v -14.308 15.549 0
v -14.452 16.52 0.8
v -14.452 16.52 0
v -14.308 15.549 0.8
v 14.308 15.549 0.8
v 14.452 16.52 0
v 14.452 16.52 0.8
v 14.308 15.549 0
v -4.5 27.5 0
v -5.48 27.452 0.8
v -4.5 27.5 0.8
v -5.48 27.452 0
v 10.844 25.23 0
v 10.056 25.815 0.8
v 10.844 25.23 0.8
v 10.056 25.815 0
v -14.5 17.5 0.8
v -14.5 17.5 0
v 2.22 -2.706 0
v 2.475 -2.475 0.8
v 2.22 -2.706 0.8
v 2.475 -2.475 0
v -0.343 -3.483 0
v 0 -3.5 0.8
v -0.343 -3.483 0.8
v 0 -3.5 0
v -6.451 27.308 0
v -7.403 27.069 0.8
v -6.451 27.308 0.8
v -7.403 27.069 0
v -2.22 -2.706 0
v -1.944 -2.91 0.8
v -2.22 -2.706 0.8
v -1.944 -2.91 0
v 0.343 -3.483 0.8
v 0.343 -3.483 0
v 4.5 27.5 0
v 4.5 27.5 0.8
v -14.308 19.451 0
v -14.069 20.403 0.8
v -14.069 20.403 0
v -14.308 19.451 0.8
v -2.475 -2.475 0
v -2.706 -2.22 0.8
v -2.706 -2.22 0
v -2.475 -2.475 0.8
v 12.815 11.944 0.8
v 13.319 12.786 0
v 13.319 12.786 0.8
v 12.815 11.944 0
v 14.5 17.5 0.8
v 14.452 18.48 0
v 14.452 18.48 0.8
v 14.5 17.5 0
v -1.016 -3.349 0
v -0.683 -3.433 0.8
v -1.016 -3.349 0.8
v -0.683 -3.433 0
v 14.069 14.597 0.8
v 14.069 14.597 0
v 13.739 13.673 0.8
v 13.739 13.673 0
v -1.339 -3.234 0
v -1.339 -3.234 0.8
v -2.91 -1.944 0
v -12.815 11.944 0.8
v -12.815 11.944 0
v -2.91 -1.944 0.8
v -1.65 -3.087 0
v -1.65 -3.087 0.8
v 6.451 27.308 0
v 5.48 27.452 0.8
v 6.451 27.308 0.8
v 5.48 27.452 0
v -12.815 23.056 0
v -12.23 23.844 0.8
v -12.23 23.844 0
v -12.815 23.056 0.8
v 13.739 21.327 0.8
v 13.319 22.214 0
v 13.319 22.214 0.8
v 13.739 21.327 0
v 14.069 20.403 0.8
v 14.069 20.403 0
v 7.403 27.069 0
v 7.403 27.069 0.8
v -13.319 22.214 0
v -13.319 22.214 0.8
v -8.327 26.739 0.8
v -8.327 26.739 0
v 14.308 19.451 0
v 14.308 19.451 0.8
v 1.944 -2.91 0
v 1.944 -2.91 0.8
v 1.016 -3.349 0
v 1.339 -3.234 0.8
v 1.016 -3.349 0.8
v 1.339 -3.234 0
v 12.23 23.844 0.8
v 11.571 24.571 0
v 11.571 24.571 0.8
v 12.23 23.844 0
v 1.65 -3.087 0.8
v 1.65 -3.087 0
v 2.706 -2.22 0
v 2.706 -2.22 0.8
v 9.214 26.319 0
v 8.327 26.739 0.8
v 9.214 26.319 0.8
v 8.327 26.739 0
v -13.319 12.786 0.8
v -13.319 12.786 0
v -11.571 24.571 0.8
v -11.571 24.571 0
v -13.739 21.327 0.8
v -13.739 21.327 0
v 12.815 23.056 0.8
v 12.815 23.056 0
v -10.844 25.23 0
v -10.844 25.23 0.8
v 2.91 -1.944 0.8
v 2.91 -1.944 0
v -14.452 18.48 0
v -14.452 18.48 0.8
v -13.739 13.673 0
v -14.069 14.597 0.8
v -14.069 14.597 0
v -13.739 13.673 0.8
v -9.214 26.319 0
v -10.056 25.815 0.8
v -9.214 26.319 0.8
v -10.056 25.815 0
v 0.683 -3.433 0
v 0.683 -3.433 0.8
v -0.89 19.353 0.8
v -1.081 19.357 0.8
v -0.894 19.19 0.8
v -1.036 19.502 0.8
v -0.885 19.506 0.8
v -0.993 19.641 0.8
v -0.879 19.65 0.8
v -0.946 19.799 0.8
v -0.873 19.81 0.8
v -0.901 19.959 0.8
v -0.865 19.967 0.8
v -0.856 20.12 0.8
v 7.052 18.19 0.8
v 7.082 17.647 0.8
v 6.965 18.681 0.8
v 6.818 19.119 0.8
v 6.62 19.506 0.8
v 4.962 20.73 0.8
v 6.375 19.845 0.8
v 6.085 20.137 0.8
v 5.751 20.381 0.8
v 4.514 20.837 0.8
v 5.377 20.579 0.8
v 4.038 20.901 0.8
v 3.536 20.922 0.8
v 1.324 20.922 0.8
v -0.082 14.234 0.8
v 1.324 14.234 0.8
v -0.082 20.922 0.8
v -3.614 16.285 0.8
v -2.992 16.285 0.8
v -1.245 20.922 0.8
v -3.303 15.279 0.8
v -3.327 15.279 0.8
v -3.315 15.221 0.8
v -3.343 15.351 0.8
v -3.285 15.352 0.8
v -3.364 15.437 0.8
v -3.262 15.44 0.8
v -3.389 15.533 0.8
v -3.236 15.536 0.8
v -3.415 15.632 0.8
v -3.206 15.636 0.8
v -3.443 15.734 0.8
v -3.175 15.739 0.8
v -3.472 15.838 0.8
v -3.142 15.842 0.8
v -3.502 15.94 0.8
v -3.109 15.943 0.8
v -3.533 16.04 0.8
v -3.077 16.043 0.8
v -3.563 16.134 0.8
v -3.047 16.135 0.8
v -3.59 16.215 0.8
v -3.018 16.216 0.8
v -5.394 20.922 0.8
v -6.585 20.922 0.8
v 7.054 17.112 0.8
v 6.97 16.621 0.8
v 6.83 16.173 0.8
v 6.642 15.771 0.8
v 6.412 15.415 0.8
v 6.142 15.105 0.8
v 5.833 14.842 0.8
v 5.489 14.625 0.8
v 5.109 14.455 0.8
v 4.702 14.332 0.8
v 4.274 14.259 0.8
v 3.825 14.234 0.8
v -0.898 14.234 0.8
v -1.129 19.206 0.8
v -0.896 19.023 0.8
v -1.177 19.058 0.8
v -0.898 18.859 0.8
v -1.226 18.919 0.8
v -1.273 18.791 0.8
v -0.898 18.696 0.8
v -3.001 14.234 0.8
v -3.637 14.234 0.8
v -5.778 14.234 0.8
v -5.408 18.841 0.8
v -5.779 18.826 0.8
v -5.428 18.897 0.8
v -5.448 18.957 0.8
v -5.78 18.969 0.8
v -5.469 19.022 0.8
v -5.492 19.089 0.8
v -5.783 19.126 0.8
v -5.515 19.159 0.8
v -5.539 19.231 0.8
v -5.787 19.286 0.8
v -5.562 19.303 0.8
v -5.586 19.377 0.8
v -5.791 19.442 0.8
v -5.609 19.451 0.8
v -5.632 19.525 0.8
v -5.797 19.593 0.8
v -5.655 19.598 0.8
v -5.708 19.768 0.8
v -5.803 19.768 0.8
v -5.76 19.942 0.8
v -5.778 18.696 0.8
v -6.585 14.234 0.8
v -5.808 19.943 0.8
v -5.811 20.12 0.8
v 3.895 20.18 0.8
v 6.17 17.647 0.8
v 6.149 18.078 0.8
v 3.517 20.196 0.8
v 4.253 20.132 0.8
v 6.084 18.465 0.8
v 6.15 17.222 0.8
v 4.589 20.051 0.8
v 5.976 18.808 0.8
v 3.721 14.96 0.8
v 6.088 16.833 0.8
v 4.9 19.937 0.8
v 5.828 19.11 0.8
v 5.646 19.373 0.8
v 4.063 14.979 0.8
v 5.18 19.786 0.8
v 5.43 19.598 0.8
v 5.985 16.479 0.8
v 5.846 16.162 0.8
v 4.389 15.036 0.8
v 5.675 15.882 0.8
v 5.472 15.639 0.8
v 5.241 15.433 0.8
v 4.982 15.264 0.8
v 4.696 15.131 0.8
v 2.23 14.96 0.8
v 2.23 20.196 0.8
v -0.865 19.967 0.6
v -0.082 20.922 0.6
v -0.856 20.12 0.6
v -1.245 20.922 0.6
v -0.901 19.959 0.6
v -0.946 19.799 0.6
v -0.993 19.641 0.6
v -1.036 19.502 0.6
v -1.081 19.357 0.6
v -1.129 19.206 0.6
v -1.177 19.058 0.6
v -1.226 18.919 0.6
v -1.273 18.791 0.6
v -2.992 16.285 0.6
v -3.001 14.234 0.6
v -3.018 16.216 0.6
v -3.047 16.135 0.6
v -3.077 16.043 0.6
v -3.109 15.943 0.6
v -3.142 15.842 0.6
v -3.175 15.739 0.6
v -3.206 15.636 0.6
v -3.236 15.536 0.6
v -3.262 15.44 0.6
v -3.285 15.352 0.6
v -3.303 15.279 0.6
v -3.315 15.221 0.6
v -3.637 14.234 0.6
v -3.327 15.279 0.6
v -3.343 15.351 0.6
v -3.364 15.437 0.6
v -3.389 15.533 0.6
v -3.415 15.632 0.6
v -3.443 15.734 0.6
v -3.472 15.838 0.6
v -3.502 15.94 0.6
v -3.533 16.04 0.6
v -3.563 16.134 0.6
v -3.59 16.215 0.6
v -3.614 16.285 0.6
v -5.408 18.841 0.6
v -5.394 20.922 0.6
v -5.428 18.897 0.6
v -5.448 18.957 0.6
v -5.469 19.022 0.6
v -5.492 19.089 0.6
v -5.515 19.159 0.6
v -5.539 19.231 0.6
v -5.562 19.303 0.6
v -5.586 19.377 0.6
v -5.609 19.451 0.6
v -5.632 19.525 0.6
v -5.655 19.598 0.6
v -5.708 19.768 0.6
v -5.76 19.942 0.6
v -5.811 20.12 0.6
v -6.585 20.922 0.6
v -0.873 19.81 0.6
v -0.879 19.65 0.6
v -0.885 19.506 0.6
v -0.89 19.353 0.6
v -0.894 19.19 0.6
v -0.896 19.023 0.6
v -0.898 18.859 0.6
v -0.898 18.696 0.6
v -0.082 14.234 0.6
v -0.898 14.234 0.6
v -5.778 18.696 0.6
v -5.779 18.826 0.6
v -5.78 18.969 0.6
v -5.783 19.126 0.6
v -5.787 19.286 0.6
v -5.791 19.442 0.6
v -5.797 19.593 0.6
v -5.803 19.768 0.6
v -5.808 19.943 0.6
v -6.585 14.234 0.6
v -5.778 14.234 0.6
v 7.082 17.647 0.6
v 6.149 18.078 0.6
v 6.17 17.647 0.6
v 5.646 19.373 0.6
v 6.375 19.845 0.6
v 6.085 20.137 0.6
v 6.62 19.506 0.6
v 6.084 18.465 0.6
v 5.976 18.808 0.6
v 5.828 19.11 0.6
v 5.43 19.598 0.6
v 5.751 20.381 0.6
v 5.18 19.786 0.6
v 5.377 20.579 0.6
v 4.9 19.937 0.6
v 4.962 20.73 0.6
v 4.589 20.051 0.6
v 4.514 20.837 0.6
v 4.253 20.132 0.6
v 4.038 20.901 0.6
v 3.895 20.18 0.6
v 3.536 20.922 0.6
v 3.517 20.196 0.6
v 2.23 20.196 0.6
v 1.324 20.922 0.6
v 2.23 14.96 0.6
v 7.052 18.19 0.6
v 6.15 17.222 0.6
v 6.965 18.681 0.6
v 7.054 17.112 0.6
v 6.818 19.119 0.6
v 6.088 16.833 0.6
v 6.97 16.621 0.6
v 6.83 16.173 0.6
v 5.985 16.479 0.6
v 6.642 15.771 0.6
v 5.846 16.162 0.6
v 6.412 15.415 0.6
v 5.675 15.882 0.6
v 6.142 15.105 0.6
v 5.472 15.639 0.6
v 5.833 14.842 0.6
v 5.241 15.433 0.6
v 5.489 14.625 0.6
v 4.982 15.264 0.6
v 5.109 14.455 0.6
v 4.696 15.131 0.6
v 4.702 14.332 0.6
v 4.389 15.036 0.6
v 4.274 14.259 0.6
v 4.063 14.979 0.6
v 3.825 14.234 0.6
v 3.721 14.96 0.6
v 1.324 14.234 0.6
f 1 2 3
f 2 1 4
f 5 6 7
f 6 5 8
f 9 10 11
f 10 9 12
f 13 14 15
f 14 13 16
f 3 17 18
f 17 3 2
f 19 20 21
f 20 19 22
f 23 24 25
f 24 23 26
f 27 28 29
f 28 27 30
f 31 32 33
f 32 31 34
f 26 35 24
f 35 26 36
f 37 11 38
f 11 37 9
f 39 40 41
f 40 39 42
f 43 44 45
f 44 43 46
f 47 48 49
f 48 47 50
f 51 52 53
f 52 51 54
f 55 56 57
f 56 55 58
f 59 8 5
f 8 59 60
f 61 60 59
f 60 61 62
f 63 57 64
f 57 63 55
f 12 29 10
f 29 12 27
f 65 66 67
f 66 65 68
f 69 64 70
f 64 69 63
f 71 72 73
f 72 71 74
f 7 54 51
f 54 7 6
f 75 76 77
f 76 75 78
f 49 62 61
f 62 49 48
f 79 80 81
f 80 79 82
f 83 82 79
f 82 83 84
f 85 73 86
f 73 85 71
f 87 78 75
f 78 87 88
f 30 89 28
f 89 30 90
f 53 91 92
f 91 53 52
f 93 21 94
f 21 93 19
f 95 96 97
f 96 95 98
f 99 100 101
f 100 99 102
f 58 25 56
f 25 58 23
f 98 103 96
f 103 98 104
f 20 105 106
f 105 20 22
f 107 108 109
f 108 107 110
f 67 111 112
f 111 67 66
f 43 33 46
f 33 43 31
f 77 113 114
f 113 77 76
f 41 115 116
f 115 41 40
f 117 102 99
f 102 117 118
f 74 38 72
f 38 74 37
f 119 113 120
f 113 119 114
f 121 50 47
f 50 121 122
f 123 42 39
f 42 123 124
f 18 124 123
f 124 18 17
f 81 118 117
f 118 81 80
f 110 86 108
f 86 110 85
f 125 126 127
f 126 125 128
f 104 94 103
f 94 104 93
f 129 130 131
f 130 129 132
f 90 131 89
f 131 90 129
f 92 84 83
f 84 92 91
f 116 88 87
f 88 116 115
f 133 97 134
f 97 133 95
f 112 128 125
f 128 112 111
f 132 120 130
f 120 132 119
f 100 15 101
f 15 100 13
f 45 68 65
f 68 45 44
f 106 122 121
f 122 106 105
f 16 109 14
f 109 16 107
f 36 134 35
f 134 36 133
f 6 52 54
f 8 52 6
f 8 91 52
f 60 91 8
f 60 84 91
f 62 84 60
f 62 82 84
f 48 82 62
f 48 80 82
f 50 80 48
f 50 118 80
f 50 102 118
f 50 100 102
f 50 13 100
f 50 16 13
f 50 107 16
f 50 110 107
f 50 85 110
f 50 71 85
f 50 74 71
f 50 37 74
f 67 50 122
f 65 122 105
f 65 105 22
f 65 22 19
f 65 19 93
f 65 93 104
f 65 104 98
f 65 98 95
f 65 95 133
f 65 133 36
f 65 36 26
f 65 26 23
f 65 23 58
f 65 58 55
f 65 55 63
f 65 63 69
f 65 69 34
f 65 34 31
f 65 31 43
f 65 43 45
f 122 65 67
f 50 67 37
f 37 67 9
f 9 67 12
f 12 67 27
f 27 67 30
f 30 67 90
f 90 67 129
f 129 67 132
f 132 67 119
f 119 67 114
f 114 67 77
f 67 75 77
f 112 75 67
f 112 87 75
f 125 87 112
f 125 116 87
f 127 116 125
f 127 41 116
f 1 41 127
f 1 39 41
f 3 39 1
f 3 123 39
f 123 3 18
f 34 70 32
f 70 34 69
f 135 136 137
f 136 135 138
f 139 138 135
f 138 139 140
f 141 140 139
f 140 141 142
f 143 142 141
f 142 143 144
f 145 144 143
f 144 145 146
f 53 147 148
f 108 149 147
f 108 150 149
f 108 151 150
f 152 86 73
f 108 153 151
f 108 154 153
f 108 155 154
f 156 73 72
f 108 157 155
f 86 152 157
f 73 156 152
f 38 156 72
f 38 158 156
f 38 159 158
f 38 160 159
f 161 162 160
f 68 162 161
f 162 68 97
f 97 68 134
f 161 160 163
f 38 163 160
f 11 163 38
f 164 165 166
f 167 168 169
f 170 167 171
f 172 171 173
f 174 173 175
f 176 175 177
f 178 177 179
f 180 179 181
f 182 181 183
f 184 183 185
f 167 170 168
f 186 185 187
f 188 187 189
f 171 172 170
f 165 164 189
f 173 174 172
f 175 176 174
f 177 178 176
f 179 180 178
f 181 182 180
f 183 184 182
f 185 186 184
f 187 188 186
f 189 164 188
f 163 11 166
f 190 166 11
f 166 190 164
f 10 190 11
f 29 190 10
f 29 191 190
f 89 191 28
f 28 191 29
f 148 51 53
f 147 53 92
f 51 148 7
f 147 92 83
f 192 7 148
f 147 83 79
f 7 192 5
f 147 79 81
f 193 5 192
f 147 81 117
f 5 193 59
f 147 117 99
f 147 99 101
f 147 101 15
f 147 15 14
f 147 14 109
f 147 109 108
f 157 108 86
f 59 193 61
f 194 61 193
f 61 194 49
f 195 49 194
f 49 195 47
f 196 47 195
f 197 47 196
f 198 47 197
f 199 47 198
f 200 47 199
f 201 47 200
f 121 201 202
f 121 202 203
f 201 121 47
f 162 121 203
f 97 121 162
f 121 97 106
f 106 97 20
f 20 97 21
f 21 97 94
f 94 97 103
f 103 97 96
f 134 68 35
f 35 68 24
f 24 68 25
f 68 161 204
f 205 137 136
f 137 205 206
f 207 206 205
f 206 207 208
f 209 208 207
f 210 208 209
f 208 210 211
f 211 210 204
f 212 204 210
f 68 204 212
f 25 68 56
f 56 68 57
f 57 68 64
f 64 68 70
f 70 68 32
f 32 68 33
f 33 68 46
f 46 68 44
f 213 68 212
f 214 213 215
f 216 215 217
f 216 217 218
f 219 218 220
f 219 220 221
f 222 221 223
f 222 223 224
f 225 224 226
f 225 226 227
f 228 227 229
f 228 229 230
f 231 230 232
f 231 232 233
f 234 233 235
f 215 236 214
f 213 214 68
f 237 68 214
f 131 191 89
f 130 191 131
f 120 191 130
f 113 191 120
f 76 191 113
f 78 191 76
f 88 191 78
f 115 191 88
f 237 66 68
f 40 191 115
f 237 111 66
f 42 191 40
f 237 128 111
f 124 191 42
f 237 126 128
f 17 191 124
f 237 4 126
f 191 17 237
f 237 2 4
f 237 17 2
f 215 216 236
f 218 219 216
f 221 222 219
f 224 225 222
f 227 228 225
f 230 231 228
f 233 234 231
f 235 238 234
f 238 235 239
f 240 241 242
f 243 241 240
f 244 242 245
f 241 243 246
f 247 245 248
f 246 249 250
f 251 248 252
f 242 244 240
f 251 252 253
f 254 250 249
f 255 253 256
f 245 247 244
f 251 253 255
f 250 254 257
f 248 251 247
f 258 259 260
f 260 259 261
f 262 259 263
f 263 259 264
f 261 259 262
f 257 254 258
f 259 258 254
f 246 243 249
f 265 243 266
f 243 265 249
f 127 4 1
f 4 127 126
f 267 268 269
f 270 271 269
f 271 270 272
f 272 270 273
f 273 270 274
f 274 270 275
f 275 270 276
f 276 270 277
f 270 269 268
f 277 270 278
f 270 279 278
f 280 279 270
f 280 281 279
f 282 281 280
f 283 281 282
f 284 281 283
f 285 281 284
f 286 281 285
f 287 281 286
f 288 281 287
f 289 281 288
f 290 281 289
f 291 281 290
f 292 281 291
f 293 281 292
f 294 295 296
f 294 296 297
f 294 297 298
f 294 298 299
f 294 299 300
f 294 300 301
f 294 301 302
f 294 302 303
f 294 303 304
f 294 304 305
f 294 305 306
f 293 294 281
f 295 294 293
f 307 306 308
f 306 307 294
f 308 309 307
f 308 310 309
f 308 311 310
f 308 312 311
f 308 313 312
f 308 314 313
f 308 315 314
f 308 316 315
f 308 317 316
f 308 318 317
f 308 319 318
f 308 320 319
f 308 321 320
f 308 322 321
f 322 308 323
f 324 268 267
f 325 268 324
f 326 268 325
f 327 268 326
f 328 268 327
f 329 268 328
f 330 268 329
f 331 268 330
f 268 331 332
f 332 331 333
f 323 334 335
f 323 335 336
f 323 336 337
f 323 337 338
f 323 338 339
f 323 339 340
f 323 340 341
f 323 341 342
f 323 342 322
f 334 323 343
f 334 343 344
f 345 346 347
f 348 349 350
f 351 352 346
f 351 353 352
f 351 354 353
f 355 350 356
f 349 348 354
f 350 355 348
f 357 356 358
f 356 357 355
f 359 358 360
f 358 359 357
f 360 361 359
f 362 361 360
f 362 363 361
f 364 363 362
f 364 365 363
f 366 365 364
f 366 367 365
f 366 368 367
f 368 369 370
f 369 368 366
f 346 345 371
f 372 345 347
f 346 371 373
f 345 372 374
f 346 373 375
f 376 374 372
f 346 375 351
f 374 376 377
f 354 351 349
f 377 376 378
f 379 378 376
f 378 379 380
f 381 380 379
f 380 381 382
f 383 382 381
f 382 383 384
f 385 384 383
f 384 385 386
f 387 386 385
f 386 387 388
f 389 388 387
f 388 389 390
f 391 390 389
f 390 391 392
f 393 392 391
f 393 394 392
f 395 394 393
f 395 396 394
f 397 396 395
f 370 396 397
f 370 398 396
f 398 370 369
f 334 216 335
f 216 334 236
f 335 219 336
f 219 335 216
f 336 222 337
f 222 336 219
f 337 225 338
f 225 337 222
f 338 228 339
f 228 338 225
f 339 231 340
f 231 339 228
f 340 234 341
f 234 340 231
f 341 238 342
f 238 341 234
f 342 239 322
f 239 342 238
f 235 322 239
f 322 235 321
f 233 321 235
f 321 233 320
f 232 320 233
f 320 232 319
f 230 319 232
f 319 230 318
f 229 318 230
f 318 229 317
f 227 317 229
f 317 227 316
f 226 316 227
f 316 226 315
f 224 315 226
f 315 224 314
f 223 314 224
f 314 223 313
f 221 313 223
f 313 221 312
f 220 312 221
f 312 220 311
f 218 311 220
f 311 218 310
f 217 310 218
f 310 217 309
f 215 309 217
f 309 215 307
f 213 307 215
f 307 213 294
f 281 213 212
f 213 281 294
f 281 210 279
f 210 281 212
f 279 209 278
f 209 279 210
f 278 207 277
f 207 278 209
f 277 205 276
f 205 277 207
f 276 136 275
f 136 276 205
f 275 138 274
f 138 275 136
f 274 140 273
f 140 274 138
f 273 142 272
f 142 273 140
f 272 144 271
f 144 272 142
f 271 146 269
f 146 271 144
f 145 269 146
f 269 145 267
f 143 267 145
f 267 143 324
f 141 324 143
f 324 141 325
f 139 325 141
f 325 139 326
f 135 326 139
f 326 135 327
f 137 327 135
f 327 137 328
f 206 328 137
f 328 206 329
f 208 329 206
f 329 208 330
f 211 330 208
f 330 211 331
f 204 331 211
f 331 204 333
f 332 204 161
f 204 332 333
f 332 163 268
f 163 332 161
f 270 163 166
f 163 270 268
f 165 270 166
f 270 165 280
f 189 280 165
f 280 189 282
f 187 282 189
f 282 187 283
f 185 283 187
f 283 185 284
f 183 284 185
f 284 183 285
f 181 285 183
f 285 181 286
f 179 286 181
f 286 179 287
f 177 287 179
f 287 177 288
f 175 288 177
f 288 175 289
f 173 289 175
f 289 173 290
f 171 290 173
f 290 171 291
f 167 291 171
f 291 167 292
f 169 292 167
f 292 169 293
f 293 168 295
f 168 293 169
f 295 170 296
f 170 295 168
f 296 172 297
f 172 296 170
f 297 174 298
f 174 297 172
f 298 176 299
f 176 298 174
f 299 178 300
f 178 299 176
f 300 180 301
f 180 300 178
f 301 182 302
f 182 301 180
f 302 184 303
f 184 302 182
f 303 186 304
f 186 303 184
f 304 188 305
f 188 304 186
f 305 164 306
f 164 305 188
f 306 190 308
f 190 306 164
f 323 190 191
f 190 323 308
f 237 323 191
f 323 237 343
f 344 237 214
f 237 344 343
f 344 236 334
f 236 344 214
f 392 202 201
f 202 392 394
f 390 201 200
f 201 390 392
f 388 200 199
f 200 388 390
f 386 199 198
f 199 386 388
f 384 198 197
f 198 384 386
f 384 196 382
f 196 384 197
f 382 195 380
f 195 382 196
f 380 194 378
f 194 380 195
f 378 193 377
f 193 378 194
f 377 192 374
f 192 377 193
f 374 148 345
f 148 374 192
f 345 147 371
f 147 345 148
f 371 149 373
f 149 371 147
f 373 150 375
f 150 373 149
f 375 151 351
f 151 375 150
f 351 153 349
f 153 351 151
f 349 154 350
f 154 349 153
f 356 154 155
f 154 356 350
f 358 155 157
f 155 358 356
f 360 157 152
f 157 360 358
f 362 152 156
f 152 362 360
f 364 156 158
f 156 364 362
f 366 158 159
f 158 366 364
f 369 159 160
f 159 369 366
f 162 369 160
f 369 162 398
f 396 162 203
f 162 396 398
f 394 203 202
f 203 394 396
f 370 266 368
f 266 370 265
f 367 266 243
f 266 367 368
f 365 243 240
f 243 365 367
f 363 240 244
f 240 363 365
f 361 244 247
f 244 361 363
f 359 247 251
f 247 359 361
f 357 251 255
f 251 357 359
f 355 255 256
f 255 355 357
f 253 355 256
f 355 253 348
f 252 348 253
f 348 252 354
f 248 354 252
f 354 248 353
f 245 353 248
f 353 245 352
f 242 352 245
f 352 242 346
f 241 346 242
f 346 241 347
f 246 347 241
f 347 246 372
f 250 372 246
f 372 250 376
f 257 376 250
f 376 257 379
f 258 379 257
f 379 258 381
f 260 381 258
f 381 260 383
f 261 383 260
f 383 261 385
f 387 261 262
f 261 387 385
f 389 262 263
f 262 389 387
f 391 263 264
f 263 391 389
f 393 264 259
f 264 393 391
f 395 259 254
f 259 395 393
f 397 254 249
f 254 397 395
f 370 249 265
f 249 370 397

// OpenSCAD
// Guitar pick, 351-style outline.
//
// The shape is the hull of three circles: two big ones for the shoulders and
// a small one for the playing tip. Different radii are the whole point - one
// radius everywhere gives a rounded triangle, not a pick.

width      = 29;    // across the widest point
length     = 31;    // tip to top edge
thickness  = 0.8;   // 4 layers at 0.2 mm. Close to the ~0.65 mm gauge Måns
                    // plays, rounded to a clean layer multiple - 0.65 is 3.25
                    // layers and the slicer would round it unevenly.
shoulder_r = 10;    // roundness of the two top corners
tip_r      = 3.5;   // roundness of the tip - smaller is pointier and brighter

initials   = "MD";
font_size  = 7;
engrave    = true;  // true: cut in. false: raised on top.
depth      = 0.2;   // 1 layer. Shallow on purpose: leaves 0.6 mm under
                    // the letters so a thin pick is not weakened.

// Shoulder centres, derived so width/length come out exactly as set above.
sx = width / 2 - shoulder_r;
sy = length - shoulder_r - tip_r;

module outline() {
  hull() {
    circle(r = tip_r, $fn = 64);                          // tip, at origin
    translate([-sx, sy]) circle(r = shoulder_r, $fn = 64);
    translate([ sx, sy]) circle(r = shoulder_r, $fn = 64);
  }
}

module body() {
  linear_extrude(height = thickness) outline();
}

module branding(z, h) {
  translate([0, sy, z])
    linear_extrude(height = h)
      text(initials, size = font_size, halign = "center", valign = "center");
}

module pick() {
  if (engrave) {
    difference() {
      body();
      // overshoot the top face so difference() leaves no skin over the letters
      branding(thickness - depth, depth + 1);
    }
  } else {
    body();
    branding(0, thickness + depth);
  }
}

pick();
